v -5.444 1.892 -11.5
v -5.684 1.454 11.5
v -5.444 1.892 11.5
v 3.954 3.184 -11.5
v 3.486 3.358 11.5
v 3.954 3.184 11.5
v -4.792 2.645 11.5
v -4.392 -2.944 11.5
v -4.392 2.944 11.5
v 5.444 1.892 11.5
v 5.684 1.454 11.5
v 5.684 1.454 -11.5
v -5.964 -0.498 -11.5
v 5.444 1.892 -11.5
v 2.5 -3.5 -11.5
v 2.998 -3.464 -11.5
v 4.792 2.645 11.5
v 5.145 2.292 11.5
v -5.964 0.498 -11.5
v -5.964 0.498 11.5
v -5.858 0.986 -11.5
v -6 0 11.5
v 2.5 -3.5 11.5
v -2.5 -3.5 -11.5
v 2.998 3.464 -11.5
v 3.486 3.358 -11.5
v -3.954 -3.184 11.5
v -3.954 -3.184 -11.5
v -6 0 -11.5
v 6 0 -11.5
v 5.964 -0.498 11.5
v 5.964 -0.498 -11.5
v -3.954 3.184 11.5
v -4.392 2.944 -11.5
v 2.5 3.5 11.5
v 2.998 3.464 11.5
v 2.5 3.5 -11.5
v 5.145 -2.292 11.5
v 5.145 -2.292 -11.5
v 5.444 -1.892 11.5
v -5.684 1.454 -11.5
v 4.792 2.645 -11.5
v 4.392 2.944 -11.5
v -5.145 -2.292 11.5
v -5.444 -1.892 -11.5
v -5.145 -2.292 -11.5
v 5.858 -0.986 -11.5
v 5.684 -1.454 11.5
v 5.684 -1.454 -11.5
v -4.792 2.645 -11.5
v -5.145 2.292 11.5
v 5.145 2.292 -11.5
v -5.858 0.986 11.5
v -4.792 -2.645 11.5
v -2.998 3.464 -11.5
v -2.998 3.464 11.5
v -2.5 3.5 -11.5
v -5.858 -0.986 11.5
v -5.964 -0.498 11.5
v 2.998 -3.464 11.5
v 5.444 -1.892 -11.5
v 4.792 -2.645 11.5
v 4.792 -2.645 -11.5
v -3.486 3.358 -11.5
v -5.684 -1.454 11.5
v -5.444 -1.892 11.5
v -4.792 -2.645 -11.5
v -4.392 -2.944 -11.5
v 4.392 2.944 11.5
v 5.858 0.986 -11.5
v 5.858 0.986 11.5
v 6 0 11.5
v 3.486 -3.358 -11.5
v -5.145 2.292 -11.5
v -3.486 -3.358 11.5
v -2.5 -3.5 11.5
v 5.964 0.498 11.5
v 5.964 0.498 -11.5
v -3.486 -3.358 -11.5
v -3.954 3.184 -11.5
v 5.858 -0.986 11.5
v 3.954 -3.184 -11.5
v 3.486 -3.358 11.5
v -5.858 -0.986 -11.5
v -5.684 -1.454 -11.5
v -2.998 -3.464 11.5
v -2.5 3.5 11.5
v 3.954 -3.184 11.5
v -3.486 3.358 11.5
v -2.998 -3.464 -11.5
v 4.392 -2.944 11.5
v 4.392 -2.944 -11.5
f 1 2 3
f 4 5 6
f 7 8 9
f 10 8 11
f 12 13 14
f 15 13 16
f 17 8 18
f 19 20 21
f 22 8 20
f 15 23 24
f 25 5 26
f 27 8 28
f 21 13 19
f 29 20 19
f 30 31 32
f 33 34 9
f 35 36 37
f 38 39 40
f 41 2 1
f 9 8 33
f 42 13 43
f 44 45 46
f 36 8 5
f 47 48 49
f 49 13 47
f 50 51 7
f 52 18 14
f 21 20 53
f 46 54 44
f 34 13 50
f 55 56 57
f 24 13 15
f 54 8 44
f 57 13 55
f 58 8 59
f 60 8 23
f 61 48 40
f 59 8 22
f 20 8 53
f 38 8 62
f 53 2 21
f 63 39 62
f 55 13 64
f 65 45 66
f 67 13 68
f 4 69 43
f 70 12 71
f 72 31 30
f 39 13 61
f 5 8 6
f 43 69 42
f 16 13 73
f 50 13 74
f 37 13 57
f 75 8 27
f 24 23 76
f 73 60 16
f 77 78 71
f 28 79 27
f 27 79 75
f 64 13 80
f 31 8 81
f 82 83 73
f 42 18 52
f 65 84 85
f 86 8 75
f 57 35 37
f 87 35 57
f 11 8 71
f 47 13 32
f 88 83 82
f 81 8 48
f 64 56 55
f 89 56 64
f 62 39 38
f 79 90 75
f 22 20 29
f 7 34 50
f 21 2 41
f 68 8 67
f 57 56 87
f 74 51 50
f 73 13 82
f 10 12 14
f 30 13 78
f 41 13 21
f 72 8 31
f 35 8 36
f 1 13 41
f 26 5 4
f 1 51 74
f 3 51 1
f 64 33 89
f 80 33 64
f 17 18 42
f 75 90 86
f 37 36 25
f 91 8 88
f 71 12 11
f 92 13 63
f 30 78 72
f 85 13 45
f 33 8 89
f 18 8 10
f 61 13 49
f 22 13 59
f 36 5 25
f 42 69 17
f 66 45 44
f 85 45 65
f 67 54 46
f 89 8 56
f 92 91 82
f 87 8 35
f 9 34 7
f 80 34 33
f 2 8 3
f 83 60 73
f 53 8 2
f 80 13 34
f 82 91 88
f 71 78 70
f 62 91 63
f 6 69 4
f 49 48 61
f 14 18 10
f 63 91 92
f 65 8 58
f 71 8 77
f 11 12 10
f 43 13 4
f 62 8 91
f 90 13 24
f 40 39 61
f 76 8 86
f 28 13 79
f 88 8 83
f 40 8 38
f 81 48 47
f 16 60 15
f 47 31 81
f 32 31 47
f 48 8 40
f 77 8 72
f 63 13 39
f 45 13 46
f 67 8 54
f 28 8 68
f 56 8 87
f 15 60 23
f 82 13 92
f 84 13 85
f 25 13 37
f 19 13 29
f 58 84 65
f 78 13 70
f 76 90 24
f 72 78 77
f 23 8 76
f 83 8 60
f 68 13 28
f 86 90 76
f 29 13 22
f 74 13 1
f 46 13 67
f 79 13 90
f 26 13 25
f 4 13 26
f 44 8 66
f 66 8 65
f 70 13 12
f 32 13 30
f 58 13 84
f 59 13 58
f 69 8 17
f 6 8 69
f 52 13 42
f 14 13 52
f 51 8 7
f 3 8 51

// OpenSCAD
// file: geometry.scad
default_plate_thickness =
  1.6;

tolerance = 0.1;

module pcb_shape() {
  import(file="../redox/pcb.dxf");
}

pcb_hole_positions =
  [ [   6.2230,  -5.2070 ]
  , [ 116.7130,  -3.3020 ]
  , [  23.3680, -80.1370 ]
  , [ 133.8580, -95.5040 ]
  ];

pcb_hole_dia =
  4.0;

module shell_shape() {
  import(file="../redox/shell.dxf", layer="Shell");
}

case_hole_positions =
  [ [   1.1034,    1.9458 ]
  , [ 143.0628,   -1.3050 ]
  , [   1.0002, -101.5929 ]
  , [ 158.2978, -114.6142 ]
  ];

// Position for each switch as it sits on the left-hand keyboard.
//
// Returns an array of positions.  Each position is itself an array
// with the following elements:
//
// 0: X.
// 1: Y.
// 2: Angle in degrees.
// 3: Key cap units in the X direction.
// 4: Key cap units in the Y direction.
//
// All measurements are to the center of the switch, and assume the
// PCB is at the origin going in the positive X direction and negative
// Y direction.
switch_positions =
  let ( row_sep = -19.05,
      , c1x =  11.9380, c1y = -17.9370, c1r5x = 14.4780
      , c2x =  33.5280, c2y = c1y
      , c3x =  52.5780, c3y = -13.4920
      , c4x =  71.6280, c4y = -10.9520
      , c5x =  90.6780, c5y = -13.4920
      , c6x = 109.7280, c6y = -15.3970
      , c7x = 128.7780
      )
  [
    // Column 1
      [ c1x,   c1y + row_sep * 0, 0, 1.25, 1.0 ] // Row 1
    , [ c1x,   c1y + row_sep * 1, 0, 1.25, 1.0 ] // Row 2
    , [ c1x,   c1y + row_sep * 2, 0, 1.25, 1.0 ] // Row 3
    , [ c1x,   c1y + row_sep * 3, 0, 1.25, 1.0 ] // Row 4
    , [ c1r5x, c1y + row_sep * 4, 0, 1.0,  1.0 ] // Row 5

    // Column 2:
    , [ c2x,   c2y + row_sep * 0, 0, 1.0, 1.0 ] // Row 1
    , [ c2x,   c2y + row_sep * 1, 0, 1.0, 1.0 ] // Row 2
    , [ c2x,   c2y + row_sep * 2, 0, 1.0, 1.0 ] // Row 3
    , [ c2x,   c2y + row_sep * 3, 0, 1.0, 1.0 ] // Row 4
    , [ c2x,   c2y + row_sep * 4, 0, 1.0, 1.0 ] // Row 5

    // Column 3:
    , [ c3x,   c3y + row_sep * 0, 0, 1.0, 1.0 ] // Row 1
    , [ c3x,   c3y + row_sep * 1, 0, 1.0, 1.0 ] // Row 2
    , [ c3x,   c3y + row_sep * 2, 0, 1.0, 1.0 ] // Row 3
    , [ c3x,   c3y + row_sep * 3, 0, 1.0, 1.0 ] // Row 4
    , [ c3x,   c3y + row_sep * 4, 0, 1.0, 1.0 ] // Row 5

    // Column 4:
    , [ c4x,   c4y + row_sep * 0, 0, 1.0, 1.0 ] // Row 1
    , [ c4x,   c4y + row_sep * 1, 0, 1.0, 1.0 ] // Row 2
    , [ c4x,   c4y + row_sep * 2, 0, 1.0, 1.0 ] // Row 3
    , [ c4x,   c4y + row_sep * 3, 0, 1.0, 1.0 ] // Row 4
    , [ c4x,   c4y + row_sep * 4, 0, 1.0, 1.0 ] // Row 5

    // Column 5:
    , [ c5x,   c5y + row_sep * 0, 0, 1.0, 1.0 ] // Row 1
    , [ c5x,   c5y + row_sep * 1, 0, 1.0, 1.0 ] // Row 2
    , [ c5x,   c5y + row_sep * 2, 0, 1.0, 1.0 ] // Row 3
    , [ c5x,   c5y + row_sep * 3, 0, 1.0, 1.0 ] // Row 4

    // Column 6:
    , [ c6x,   c6y + row_sep * 0, 0, 1.0, 1.0 ] // Row 1
    , [ c6x,   c6y + row_sep * 1, 0, 1.0, 1.0 ] // Row 2
    , [ c6x,   c6y + row_sep * 2, 0, 1.0, 1.0 ] // Row 3
    , [ c6x,   c6y + row_sep * 3, 0, 1.0, 1.0 ] // Row 4

    // Column 7:
    , [ c7x,   -24.9220, 0,  1.0, 1.0 ] // Row 1.5
    , [ c7x,   -49.0520, 90, 1.5, 1.0 ] // Row 2.5

    // Thumb Keys:
    , [  97.0280,   -92.8670, -15,  1.25, 1.0 ]
    , [ 132.5880,   -78.8970, -30,  1.0,  1.0 ]
    , [ 149.0980,   -88.3920, -30,  1.0,  1.0 ]
    , [ 120.5230,   -99.8520, -120, 1.5,  1.0 ]
    , [ 137.03301, -109.3470, -120, 1.5,  1.0 ]
  ];

pcb_leg_positions =
  [ [   2.7220,  -27.3546 ]
  , [   2.8070,  -65.5913 ]
  , [  22.6819,  -46.4306 ]
  , [  42.9018,  -27.5592 ]
  , [  43.4402,  -61.0724 ]
  , [  62.0000,  -3.0300  ]
  , [  62.5043,  -39.8026 ]
  , [  62.2639,  -78.4369 ]
  , [  81.1491,  -51.5879 ]
  , [ 100.0563,  -81.6159 ]
  , [ 100.0000,  -23.0300 ]
  , [ 100.0000,  -61.6264 ]
  , [ 104.3878, -103.7437 ]
  , [ 119.0000,  -25.0300 ]
  , [ 119.0000,  -63.1460 ]
  , [ 136.0000,  -37.0000 ]
  ];


// Should be large enough to accommodate an M3 insert.
m3_insert_dia = 4;
m3_insert_depth = 4.5;

dim_shell_rot = -10;
dim_shell_offset_x = 4; // How far the shell goes to the left of the PCB.
dim_shell_offset_y = 7.2; // How far the shell goes above the PCB.
dim_shell_offset_y2 = 7.94; // Offset from the shell to the PCB on the right side.
dim_shell_x1 = 152.77; // Total width of the back of the shell.
dim_shell_max_x = 176.60; // The widest possible value for X.
dim_shell_max_y = 137.67; // The tallest possible value for Y.
dim_mount_len = 72;
dim_mount_offset_y = 15;
dim_mount_depth = 12;


dim_trrs_x = 130; // From left edge of PCB to center of TRRS jack
dim_trrs_z = 5; // From top of PCB to center of jack
dim_trrs_y = 6.25; // From pcb to shell;

dim_usb_x = 71.25; // From left edge of the PCB to center of the USB port
dim_usb_z = 3.5;  // From top of PCB to center of USB port.
/* dim_usb_z = 2.9;  // From top of PCB to center of USB port. */
dim_usb_y = 3.58; // From PCB to shell.
dim_usb_overhang = 3; // USB port positive overhang off the PCB on Y axis.

dim_microcontroller_x = 18.6; // How wide is the Pro Micro/Elite-C?
// main file
include <geometry.scad>

$fa = 1.0;
$fs = 0.5;

module each_pos(positions) {
  for (pos = positions) {
    translate([pos.x, pos.y, 0])
      children();
  }
}

// These exist because I couldn't get dims out of the DXF file for
// some reason.  OpenSCAD would return the position of the text label,
// not the actual dim.

module round(amount=4)
{
  offset(r = amount)
    offset(delta = -amount)
    children();
}

// A side (c) and two adjacent angles (A, B) given (ASA)
//
// Returns a vector where the elements are remaining sides (a and b)
// and the other angle (C).
//
// https://en.wikipedia.org/wiki/Solution_of_triangles#A_side_and_two_adjacent_angles_given_(ASA)
function triangle_asa(c, A, B) =
  let ( C = 180 - A - B
      , a = c * sin(A) / sin(C)
      , b = c * sin(B) / sin(C)
      )
  [a, b, C];

// A side (c), one adjacent angle (A) and the opposite angle (C) given (AAS)
function triangle_aas(c, A, C) =
  let ( B = 180 - A - C
      , a = c * sin(A) / sin(C)
      , b = c * sin(B) / sin(C)
      )
  [ a, b, B ];

let ( t = triangle_aas(7, 35, 62) )
assert(round(t[0]) == 5 && round(t[1]) == 8 && t[2] == 83, t);

// Two sides (a, b) and the included angle (C) given (SAS).
function triangle_sas(a, b, C) =
  let ( c = sqrt(pow(a, 2) + pow(b, 2) - (2 * a * b * cos(C)))
      , A = acos((pow(b, 2) + pow(c, 2) - pow(a, 2)) / (2 * b * c))
      , B = 180 - A - C
      )
  [ c, A, B];

let ( t = triangle_sas(5, 7, 49) )
assert(round(t[0]) == 5 && round(t[1]) == 45 && round(t[2]) == 86, t);

module m3_insert(center=false)
{
  translate([0, 0, center ? 0 : m3_insert_depth/2])
    cylinder(d=m3_insert_dia,
             h=m3_insert_depth,
             center=true);
}

module m3_stud(wall_thickness=2, height)
{
  outer_dia = m3_insert_dia + wall_thickness;

  difference() {
    cylinder(d=outer_dia, h=height, center=true);
    cylinder(d=m3_insert_dia, h=height+0.2, center=true);
  }
}

// A tapered M3 screw head.
//
// The head is centered.
module m3_screw_head(height)
{
  upper_dia = 6 + tolerance;
  lower_dia = 3 + tolerance;
  rim_height = 0.75;
  head_height = 2;
  body_height = height - head_height;

  translate([0, 0, -(height/2)])  {
    translate([0, 0, body_height]) {
      hull() {
        translate([0, 0, head_height + rim_height/2])
          cylinder(d=upper_dia, h=rim_height, center=true);

        translate([0, 0, rim_height/2])
          cylinder(d=lower_dia, h=rim_height, center=true);
      }
    }

    translate([0, 0, body_height/2])
      cylinder(d=lower_dia, h=body_height, center=true);
  }
}

module usb_c_plug(h=23) {
  width = 12;
  dia = 7;
  gap = width/2 - dia/2;

  hull() {
    translate([-gap, 0, 0])
      cylinder(d=dia, h=h, center=true);

    translate([gap, 0, 0])
      cylinder(d=dia, h=h, center=true);
  }
}

module trrs_plug(h=15) {
  cylinder(d=8.25, h=h, center=true);
}

usb_c_plug();
